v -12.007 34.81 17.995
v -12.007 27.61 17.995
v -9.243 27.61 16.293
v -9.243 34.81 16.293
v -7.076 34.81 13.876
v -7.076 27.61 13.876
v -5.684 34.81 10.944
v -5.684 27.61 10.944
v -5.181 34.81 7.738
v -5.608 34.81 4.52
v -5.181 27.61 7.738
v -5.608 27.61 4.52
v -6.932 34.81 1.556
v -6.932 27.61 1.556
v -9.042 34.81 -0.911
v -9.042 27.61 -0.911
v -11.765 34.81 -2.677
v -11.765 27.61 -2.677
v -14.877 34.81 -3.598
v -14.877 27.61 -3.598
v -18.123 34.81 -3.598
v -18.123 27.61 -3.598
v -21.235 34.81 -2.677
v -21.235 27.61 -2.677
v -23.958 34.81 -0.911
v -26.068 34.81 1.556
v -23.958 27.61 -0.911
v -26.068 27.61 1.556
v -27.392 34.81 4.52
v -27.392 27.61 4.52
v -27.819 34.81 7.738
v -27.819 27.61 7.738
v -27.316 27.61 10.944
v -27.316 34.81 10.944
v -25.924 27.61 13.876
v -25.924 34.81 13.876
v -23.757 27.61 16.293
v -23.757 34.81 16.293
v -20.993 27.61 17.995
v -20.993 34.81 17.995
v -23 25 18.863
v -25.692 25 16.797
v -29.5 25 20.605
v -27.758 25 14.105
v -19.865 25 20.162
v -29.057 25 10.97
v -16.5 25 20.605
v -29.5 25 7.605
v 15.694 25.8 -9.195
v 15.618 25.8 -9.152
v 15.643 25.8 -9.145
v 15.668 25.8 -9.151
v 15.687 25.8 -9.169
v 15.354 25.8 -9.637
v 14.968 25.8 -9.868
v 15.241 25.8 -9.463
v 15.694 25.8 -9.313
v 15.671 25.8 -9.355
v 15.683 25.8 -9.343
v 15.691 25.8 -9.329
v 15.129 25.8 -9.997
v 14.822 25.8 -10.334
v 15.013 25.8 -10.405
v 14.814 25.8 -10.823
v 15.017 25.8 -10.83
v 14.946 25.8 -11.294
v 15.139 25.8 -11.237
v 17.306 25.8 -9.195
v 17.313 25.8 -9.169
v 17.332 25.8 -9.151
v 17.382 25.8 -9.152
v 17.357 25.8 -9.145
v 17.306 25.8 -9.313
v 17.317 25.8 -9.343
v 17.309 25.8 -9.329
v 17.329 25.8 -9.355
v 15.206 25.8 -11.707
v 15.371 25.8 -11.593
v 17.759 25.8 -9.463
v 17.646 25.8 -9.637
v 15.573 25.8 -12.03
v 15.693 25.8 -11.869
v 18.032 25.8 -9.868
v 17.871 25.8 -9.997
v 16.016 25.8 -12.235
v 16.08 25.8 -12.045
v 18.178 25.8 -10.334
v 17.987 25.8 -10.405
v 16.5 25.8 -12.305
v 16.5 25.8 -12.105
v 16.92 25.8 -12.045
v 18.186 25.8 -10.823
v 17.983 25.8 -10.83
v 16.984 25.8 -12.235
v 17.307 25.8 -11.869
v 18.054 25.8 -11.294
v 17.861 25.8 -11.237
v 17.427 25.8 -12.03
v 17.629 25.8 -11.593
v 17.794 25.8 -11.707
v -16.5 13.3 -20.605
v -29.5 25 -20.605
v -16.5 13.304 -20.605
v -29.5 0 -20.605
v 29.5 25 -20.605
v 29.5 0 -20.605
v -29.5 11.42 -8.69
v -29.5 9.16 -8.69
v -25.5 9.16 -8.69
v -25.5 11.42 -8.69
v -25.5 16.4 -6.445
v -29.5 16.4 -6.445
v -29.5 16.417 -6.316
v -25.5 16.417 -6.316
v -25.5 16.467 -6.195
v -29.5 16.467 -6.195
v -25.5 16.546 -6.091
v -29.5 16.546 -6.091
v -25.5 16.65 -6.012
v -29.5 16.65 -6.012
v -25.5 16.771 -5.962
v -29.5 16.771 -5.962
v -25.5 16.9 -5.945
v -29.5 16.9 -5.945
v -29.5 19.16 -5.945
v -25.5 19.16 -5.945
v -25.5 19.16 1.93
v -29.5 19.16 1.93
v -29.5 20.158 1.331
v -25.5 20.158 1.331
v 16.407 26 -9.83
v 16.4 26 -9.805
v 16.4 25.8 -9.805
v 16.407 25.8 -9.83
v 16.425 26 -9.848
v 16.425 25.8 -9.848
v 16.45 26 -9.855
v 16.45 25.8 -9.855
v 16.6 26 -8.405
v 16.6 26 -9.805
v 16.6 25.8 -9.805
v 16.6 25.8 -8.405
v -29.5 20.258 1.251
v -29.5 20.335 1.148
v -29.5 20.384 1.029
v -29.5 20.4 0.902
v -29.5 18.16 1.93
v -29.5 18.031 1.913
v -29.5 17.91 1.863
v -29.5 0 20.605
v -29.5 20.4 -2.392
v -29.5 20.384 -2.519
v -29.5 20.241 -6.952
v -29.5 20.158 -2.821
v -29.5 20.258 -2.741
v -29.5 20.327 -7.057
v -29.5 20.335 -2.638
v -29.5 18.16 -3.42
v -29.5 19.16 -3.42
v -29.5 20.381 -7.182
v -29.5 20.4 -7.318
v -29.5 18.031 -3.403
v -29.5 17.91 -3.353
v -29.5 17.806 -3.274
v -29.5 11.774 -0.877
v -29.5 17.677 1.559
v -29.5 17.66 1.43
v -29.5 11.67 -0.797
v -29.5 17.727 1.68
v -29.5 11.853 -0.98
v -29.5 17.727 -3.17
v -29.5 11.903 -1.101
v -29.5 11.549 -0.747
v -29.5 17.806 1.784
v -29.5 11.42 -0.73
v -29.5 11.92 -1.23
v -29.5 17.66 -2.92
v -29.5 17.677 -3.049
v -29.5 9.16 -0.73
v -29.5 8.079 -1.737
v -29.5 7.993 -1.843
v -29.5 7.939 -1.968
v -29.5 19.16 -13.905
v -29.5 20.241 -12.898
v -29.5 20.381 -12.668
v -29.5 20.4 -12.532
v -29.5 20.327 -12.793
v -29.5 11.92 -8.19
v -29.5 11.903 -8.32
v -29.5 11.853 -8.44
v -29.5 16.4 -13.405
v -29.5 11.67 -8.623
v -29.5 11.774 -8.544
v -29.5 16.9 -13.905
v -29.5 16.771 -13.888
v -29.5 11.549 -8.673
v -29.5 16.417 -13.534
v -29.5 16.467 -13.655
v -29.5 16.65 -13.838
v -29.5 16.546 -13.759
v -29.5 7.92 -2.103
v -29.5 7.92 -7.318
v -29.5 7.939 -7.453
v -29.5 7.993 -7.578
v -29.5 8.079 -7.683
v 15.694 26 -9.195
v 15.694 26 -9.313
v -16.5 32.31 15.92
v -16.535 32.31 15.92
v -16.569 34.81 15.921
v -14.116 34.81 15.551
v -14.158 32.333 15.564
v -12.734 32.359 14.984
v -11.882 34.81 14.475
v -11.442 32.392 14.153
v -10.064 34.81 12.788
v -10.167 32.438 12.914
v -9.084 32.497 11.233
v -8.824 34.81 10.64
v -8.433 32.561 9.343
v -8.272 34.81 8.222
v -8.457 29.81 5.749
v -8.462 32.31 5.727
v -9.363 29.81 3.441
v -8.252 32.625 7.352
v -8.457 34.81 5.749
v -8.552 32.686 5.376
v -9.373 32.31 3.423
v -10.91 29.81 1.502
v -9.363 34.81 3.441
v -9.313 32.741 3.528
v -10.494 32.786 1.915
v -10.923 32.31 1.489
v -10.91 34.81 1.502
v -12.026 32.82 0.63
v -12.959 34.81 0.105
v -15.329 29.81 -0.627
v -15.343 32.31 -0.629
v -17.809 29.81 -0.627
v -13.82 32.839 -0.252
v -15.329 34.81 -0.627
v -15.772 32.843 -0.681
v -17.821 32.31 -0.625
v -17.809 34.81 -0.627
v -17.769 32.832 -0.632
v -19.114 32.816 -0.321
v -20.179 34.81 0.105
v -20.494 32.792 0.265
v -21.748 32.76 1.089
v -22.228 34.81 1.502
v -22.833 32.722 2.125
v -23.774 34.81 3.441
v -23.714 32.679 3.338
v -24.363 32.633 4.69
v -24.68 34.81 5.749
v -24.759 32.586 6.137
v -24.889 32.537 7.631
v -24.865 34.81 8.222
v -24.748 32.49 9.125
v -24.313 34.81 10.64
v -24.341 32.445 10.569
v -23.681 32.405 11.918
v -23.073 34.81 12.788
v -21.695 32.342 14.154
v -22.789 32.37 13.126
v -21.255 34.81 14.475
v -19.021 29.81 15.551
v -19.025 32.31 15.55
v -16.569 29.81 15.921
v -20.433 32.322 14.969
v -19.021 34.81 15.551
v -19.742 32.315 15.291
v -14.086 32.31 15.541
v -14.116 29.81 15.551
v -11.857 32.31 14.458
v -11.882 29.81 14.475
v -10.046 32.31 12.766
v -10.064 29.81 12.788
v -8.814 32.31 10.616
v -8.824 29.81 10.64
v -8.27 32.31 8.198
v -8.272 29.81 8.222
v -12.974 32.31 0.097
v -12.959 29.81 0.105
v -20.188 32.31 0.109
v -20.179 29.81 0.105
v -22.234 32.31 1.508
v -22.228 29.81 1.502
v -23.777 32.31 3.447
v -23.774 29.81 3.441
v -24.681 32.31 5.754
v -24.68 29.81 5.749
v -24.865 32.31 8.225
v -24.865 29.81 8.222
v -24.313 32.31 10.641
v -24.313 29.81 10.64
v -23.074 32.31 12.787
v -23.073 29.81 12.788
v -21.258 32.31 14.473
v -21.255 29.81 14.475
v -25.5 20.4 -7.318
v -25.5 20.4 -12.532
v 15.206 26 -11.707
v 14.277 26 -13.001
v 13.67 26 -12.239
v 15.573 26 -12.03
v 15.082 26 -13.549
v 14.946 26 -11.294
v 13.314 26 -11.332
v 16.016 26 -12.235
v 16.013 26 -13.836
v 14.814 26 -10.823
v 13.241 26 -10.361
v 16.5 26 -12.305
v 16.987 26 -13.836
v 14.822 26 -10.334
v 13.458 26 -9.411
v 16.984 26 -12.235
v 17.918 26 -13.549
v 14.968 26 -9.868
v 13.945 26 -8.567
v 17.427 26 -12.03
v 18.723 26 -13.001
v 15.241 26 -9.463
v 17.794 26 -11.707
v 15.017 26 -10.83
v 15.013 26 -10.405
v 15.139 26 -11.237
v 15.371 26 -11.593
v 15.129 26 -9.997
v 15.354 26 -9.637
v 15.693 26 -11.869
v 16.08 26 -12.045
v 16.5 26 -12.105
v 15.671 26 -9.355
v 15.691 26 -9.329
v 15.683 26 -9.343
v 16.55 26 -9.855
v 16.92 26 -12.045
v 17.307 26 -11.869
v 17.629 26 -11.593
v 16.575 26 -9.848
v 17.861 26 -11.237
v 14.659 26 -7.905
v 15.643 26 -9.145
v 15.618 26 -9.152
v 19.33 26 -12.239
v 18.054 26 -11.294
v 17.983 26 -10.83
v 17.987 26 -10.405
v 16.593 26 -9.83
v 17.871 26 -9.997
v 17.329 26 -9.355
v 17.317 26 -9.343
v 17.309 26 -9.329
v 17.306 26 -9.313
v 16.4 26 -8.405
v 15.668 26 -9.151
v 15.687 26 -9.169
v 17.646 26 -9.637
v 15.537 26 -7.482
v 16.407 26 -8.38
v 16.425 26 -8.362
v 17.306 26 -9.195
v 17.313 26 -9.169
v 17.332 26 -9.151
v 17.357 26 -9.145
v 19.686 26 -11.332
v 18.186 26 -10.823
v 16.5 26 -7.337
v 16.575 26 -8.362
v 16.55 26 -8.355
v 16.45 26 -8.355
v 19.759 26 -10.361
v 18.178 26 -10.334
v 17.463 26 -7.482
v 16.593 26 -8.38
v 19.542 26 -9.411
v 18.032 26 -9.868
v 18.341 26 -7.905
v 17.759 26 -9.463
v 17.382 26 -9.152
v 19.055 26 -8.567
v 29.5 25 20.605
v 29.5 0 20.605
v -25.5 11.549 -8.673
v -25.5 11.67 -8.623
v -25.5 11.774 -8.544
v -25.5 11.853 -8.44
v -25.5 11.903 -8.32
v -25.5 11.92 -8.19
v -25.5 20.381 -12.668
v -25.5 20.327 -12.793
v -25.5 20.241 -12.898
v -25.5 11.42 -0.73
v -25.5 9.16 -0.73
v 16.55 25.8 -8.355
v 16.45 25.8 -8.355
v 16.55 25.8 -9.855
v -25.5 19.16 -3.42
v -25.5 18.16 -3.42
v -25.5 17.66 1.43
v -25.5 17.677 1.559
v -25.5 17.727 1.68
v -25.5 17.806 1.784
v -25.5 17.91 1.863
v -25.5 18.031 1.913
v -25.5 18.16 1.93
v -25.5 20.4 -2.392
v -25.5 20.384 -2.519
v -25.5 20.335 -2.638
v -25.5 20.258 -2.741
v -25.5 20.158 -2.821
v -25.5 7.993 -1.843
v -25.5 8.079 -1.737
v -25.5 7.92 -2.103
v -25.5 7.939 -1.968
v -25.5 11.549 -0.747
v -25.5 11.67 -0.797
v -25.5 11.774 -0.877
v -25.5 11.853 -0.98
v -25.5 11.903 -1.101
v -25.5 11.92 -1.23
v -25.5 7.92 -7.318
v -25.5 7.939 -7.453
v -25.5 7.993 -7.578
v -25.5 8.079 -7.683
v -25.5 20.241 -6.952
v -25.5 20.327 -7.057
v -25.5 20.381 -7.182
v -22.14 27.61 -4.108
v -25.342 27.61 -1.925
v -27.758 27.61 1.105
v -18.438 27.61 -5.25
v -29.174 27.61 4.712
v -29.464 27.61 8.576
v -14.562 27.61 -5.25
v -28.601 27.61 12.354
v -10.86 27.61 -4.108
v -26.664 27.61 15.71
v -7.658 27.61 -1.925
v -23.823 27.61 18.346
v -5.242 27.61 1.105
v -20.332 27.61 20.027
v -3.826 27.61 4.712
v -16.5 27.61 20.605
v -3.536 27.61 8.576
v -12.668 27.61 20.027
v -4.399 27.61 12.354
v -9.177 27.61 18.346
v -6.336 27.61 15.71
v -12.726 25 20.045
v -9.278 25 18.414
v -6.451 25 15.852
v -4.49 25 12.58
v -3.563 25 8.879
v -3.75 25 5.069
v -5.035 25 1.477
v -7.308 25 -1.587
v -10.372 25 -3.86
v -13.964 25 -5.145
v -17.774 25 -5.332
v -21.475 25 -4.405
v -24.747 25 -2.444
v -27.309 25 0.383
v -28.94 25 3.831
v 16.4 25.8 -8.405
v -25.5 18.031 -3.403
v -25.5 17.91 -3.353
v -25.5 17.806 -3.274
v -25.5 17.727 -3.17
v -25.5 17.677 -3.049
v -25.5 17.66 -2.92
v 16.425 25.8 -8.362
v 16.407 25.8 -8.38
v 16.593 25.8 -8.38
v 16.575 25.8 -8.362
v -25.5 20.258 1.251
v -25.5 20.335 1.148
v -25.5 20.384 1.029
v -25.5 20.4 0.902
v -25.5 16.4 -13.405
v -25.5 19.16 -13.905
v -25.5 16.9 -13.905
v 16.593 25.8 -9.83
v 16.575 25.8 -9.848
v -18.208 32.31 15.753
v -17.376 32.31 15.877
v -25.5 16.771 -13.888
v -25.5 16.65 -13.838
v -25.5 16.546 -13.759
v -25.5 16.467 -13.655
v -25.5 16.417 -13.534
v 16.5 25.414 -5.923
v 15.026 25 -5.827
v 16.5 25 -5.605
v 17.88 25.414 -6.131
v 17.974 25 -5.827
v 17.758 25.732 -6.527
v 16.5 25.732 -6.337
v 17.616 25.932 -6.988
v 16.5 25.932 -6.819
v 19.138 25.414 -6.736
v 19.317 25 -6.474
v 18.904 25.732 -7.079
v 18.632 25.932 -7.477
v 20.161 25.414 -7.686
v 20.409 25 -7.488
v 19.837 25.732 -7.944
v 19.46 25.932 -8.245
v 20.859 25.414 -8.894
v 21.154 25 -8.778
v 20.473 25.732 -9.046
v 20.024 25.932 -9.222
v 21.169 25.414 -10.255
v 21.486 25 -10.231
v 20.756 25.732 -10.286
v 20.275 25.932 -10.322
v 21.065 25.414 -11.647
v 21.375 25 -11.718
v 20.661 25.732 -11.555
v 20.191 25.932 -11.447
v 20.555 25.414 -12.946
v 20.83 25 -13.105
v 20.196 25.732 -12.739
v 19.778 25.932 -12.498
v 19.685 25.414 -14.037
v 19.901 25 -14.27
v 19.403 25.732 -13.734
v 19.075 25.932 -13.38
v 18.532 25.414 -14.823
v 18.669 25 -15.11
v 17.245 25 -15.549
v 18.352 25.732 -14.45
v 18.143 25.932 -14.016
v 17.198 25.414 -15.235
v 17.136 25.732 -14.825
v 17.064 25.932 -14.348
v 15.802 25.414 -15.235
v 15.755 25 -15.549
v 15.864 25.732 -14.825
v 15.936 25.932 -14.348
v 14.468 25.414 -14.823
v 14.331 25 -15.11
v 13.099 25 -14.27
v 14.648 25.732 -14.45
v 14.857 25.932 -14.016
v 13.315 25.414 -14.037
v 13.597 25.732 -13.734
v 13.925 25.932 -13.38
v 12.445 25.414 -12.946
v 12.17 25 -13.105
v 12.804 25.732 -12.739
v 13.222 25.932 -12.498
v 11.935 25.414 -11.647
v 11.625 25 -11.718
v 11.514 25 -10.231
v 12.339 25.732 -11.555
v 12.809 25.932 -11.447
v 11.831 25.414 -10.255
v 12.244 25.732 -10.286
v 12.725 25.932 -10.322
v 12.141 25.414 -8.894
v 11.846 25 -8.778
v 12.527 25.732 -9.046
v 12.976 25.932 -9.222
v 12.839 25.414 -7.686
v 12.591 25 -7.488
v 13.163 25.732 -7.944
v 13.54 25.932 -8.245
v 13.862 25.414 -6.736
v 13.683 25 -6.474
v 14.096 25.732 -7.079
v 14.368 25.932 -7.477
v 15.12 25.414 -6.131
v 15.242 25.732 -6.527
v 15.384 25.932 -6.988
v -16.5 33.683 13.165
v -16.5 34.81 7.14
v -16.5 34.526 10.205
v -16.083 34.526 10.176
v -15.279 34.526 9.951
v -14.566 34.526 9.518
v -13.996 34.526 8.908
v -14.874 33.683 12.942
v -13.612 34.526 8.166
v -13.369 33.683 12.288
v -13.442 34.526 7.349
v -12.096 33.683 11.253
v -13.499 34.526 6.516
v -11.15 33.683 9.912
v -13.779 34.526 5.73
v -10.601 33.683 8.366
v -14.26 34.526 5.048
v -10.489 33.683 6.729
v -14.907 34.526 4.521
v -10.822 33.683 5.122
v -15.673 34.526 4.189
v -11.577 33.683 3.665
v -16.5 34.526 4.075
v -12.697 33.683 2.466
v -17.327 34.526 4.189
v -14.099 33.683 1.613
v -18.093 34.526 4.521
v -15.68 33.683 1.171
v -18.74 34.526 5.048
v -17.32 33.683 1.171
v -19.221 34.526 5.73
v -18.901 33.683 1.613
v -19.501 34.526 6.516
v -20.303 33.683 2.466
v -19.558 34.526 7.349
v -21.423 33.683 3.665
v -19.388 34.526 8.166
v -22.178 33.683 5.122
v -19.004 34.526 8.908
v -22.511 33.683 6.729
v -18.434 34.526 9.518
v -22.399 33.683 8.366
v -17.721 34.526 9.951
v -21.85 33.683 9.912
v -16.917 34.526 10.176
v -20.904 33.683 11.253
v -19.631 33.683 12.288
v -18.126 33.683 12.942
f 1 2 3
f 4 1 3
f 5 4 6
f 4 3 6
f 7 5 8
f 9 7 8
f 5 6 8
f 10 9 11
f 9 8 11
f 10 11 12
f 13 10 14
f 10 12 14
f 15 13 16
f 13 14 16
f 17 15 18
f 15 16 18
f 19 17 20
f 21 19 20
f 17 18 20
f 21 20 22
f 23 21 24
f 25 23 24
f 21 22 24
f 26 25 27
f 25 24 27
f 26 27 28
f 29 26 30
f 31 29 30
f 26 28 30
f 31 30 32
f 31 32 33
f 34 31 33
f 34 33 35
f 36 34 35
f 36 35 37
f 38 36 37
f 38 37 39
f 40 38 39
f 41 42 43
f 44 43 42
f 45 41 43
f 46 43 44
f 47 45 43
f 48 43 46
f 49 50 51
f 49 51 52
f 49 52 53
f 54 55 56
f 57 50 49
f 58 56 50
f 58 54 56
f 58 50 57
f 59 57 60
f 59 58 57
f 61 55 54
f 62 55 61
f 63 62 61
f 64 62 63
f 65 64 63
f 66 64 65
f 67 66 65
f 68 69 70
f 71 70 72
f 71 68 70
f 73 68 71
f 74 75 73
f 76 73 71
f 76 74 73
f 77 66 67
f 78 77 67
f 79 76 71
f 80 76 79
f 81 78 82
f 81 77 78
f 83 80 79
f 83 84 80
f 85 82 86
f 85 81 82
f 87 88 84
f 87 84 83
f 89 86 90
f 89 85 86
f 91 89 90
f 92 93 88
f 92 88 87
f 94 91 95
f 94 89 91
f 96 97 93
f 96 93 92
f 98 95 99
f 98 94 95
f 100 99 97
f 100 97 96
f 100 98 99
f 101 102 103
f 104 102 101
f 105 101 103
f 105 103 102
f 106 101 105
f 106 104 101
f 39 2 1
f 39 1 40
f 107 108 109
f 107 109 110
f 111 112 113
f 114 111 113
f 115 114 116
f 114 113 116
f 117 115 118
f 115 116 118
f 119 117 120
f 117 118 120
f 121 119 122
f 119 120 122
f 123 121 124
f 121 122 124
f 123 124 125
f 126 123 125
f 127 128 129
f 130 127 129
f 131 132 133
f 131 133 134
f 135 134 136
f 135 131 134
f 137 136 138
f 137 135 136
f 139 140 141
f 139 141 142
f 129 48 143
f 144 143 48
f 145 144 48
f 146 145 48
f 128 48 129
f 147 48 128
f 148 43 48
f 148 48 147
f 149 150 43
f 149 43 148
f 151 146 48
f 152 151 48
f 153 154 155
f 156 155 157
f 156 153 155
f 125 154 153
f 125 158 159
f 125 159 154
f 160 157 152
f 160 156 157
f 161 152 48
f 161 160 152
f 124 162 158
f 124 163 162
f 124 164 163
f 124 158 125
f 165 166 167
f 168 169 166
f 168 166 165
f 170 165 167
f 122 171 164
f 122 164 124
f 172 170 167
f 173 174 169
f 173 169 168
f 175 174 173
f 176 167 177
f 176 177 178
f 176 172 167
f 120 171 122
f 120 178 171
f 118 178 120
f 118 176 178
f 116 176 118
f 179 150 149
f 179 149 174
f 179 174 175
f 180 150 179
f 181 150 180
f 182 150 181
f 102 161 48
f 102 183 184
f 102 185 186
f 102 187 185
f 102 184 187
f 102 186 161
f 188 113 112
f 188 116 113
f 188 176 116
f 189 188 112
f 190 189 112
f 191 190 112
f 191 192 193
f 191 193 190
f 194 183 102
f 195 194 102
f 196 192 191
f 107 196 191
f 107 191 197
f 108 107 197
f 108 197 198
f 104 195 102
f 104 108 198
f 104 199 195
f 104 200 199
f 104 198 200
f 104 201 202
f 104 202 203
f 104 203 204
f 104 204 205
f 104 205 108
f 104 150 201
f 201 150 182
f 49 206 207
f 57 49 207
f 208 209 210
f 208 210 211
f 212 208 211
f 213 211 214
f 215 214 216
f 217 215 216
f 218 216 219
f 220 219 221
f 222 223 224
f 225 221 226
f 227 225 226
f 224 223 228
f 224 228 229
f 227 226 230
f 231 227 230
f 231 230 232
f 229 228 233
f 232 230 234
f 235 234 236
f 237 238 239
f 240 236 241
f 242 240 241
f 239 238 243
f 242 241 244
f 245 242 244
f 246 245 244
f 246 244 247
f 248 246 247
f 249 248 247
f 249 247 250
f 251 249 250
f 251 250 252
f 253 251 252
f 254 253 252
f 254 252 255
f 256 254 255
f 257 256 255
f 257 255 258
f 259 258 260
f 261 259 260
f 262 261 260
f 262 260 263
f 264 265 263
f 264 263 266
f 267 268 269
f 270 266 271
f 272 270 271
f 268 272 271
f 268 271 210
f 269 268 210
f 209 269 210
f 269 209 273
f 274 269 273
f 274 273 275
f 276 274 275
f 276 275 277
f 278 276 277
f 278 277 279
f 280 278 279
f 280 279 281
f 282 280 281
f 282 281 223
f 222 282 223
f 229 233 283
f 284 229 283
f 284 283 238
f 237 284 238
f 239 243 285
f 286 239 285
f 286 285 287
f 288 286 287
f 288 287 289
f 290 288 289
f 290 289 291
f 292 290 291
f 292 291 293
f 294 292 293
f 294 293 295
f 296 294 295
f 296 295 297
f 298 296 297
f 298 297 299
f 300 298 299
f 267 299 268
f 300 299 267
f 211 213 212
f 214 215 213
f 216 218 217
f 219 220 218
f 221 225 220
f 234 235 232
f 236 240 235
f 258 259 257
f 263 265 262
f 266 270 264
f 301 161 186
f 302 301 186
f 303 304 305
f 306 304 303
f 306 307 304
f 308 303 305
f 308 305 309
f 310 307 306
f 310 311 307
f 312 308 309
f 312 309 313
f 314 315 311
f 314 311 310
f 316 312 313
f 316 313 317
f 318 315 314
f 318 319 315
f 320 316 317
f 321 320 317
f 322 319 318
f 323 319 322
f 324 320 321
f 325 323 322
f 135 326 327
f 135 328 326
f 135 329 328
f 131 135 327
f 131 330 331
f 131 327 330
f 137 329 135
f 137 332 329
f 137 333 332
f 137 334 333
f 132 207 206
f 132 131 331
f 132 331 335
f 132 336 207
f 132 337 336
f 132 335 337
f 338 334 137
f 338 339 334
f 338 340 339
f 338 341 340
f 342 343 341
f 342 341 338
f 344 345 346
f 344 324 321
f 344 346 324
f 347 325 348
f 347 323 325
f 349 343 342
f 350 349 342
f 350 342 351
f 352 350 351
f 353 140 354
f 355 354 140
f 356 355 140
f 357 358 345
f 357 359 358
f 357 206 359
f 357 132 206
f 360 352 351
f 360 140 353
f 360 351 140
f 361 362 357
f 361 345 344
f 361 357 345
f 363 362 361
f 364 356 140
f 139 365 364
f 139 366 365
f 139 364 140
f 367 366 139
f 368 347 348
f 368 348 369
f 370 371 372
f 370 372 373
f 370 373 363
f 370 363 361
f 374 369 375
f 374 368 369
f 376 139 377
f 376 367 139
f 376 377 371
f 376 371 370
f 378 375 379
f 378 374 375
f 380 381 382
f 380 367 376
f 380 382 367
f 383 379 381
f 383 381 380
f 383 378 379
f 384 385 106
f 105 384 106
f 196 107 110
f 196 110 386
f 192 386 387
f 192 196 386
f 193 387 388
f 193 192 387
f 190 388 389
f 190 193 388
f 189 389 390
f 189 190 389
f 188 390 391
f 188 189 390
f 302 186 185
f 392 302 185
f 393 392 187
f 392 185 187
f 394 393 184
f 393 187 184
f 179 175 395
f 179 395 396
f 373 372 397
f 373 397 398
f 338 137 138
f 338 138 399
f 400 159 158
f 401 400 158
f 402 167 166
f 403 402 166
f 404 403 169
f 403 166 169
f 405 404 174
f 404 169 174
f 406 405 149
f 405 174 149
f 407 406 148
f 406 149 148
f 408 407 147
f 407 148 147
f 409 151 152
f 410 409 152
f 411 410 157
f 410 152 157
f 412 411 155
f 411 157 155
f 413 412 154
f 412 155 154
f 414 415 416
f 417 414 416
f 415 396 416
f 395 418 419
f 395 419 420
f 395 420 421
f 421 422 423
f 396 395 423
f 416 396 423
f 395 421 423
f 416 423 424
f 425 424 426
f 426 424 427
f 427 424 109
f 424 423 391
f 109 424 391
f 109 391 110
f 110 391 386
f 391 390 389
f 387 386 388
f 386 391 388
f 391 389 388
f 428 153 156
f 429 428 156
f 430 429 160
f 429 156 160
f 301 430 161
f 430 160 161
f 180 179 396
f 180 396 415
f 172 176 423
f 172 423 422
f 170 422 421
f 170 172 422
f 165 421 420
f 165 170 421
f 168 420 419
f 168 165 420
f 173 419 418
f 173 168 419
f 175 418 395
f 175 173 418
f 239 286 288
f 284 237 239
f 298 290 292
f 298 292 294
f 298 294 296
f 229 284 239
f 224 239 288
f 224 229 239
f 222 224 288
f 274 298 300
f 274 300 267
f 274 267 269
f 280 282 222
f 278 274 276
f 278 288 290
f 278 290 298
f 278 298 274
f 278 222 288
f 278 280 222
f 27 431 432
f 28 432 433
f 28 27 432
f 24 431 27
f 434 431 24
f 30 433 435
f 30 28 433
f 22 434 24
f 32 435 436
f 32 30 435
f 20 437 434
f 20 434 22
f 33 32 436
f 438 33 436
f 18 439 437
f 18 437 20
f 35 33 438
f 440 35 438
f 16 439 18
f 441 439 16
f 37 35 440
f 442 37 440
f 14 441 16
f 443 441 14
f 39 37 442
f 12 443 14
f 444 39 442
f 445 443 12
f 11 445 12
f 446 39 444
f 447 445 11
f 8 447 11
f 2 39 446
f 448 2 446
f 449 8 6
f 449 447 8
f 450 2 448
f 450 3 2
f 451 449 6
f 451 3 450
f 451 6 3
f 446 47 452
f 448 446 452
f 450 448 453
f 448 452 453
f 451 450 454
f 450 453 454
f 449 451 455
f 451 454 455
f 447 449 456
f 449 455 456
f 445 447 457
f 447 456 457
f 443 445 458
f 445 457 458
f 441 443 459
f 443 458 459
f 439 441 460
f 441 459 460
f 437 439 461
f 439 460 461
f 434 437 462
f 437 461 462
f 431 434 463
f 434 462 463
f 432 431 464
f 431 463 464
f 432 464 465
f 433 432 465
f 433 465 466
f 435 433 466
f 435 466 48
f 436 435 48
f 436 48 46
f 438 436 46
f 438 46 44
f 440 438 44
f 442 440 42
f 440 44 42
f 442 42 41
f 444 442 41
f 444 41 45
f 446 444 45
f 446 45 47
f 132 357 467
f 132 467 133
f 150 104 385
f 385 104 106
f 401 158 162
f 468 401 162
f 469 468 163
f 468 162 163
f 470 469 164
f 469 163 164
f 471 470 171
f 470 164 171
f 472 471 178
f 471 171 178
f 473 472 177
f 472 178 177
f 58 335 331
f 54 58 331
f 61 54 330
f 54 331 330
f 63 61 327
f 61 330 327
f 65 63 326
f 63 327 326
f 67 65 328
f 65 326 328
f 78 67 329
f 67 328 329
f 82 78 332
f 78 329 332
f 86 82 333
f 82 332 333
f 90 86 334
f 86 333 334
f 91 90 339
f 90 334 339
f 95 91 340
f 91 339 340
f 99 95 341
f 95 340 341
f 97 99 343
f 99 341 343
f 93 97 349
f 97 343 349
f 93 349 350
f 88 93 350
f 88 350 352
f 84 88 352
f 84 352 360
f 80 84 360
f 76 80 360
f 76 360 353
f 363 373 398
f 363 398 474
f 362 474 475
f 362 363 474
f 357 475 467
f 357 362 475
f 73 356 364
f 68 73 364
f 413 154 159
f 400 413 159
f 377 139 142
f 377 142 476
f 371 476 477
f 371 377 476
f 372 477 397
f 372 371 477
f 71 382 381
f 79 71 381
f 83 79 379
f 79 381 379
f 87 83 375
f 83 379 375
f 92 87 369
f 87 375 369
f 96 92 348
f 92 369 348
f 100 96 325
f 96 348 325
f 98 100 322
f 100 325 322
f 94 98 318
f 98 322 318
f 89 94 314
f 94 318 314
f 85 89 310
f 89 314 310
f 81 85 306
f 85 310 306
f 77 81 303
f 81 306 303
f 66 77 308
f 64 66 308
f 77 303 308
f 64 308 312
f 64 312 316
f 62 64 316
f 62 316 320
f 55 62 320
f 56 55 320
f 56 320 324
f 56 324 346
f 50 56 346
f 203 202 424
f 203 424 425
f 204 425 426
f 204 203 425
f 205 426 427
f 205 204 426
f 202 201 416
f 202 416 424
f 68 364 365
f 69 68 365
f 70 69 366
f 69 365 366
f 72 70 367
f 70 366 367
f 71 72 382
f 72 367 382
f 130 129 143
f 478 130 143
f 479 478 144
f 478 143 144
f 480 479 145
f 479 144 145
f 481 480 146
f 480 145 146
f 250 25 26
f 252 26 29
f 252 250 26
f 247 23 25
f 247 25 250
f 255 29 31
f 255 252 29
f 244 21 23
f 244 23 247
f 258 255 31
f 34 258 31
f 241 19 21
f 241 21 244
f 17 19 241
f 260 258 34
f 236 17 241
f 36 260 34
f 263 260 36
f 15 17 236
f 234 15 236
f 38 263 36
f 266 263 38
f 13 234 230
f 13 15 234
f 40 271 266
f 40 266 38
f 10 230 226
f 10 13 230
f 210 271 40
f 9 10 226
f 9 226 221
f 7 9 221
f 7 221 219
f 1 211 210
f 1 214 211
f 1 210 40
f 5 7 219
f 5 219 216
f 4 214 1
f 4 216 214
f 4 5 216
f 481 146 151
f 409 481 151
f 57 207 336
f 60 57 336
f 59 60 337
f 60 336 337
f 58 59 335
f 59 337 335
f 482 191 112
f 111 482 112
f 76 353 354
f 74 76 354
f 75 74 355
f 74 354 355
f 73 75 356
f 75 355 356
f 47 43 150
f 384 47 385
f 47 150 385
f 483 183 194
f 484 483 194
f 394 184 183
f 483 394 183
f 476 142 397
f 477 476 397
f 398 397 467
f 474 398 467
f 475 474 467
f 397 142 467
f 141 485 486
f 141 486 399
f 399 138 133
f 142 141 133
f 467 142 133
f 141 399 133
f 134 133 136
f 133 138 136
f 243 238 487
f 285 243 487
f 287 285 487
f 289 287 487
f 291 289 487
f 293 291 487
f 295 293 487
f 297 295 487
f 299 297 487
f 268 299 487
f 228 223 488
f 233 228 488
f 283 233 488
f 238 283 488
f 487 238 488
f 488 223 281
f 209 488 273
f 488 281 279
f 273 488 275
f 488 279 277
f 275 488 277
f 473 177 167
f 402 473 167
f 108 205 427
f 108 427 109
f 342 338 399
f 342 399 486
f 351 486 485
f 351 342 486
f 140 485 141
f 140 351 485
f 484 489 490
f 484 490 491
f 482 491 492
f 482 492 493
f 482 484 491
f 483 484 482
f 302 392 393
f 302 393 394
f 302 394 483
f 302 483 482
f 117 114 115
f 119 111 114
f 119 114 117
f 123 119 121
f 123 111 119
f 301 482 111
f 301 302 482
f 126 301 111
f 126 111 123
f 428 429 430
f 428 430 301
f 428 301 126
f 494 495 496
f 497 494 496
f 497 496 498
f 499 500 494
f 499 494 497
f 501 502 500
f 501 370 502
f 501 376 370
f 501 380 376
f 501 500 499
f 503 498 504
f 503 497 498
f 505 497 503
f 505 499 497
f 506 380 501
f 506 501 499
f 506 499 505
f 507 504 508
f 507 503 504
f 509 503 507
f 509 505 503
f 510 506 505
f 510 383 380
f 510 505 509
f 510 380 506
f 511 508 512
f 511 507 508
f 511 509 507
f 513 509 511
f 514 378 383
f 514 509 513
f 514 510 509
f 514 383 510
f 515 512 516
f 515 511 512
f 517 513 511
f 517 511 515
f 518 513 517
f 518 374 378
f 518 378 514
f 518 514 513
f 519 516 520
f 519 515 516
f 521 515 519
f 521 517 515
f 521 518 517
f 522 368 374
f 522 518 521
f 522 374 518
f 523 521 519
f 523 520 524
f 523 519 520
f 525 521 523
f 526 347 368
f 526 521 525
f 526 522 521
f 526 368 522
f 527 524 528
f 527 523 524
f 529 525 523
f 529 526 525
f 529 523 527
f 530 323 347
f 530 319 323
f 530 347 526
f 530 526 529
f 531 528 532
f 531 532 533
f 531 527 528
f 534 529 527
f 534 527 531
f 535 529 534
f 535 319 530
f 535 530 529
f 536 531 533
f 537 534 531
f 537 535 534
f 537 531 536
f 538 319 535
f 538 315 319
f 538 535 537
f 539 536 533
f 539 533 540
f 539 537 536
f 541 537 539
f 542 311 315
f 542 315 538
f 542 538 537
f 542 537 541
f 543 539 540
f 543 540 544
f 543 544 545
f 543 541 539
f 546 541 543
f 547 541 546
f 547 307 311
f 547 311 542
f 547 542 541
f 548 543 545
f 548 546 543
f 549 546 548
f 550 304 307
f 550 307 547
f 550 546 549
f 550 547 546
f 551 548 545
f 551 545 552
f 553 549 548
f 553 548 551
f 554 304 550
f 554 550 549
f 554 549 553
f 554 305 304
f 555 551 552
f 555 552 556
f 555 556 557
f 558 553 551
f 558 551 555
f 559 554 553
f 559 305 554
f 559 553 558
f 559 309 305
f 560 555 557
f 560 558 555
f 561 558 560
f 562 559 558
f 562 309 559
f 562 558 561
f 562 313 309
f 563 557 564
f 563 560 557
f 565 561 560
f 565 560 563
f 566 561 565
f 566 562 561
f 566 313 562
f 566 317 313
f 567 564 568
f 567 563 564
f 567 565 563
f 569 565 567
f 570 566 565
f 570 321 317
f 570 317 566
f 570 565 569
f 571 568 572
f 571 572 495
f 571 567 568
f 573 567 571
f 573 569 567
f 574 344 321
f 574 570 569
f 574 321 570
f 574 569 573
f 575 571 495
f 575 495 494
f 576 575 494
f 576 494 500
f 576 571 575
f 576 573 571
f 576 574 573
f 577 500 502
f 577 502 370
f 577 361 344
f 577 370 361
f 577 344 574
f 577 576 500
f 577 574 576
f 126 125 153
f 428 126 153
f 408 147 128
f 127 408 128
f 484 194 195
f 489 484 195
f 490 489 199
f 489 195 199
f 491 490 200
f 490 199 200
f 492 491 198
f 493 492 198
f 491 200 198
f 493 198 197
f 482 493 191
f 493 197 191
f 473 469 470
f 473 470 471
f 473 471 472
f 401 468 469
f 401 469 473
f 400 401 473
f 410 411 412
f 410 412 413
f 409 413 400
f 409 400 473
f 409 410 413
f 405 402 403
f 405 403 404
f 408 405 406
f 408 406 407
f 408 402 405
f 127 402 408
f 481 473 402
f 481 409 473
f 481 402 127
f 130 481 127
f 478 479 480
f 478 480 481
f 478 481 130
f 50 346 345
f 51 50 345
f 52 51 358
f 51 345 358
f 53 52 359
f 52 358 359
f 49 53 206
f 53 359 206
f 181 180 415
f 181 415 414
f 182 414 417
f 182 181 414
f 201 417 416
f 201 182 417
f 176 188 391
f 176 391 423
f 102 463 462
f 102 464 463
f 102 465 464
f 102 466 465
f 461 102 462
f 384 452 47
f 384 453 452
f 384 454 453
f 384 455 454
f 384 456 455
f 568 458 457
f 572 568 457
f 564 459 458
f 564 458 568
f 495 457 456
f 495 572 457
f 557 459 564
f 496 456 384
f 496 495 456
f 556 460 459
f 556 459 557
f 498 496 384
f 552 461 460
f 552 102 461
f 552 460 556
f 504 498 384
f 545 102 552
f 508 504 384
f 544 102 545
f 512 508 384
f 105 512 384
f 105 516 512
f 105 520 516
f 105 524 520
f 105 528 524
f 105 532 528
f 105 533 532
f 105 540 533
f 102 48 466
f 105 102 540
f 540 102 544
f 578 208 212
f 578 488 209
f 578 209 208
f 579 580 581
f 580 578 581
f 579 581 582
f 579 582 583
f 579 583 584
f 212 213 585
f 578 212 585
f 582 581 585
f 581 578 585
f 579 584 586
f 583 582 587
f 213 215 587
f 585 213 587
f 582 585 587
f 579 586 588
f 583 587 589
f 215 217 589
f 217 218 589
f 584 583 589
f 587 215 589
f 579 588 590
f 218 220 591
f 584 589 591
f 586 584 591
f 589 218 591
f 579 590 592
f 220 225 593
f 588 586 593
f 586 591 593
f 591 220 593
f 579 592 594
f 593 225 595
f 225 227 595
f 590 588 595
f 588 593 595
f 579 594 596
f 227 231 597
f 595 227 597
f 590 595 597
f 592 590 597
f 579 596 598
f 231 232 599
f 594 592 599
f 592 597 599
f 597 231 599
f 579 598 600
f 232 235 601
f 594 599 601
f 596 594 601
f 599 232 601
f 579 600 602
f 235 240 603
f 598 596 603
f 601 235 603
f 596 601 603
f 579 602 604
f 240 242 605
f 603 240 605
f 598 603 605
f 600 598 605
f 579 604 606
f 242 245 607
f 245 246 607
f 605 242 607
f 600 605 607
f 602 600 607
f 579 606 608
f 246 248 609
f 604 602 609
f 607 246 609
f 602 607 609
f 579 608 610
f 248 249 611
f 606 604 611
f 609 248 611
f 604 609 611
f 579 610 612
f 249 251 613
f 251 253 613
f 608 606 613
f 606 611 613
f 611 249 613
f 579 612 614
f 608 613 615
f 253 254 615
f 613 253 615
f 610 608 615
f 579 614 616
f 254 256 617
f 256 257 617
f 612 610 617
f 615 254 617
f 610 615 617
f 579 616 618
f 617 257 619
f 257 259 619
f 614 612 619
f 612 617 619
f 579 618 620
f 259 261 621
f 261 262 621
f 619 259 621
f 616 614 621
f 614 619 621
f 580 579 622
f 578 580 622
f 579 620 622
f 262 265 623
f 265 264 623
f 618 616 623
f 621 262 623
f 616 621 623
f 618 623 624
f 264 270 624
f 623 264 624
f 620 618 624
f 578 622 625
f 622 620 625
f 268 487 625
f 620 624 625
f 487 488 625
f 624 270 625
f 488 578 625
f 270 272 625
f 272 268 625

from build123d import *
from build123d.topology import SkipClean

# Parameters (mm, degrees)
CROQUIS1_W              = 59
CROQUIS1_H              = 41.21
SALIENTE_EXTRUIR1_DEPTH = 25
CROQUIS2_R              = 13
SALIENTE_EXTRUIR2_DEPTH = 9.81
CORTAR_EXTRUIR1_START   = -7.2
CROQUIS4_R              = 13
CROQUIS4_R_2            = 11.32
CORTAR_EXTRUIR1_DEPTH   = 7.2
CORTAR_EXTRUIR2_START   = -7.2
CORTAR_EXTRUIR2_DEPTH   = 7.2
CROQUIS7_R              = 8.32
CORTAR_EXTRUIR3_DEPTH   = 5
CROQUIS10_R             = 5
SALIENTE_EXTRUIR3_DEPTH = 1
REDONDEO1_R             = 2
CORTAR_EXTRUIR5_DEPTH   = 0.2
CROQUIS13_R             = 2.5
CORTAR_EXTRUIR6_DEPTH   = 5.2
ROSCA1_PITCH            = 0.8
CORTAR_EXTRUIR8_DEPTH   = 4
CROQUIS17_W             = 9.488888662
CROQUIS17_H             = 7.855040283
SALIENTE_EXTRUIR4_DEPTH = 10


with BuildPart() as part:
    # Croquis1 → Saliente-Extruir1 (new body)
    with BuildSketch(Plane(origin=(0, 0, 0), x_dir=(1, 0, 0), z_dir=(0, 1, 0))):
        Rectangle(CROQUIS1_W, CROQUIS1_H)
    extrude(amount=SALIENTE_EXTRUIR1_DEPTH)

    # Croquis2 → Saliente-Extruir2 (add)
    with BuildSketch(Plane(origin=(0, 25, 0), x_dir=(1, 0, 0), z_dir=(0, 1, 0))):
        with Locations(Location((-16.5, -7.605, 0), (0, 0, 270))):
            Circle(CROQUIS2_R)
    extrude(amount=SALIENTE_EXTRUIR2_DEPTH)

    # Croquis4 → Cortar-Extruir1 (cut)
    with BuildSketch(Plane(origin=(0, 34.81, 0), x_dir=(1, 0, 0), z_dir=(0, 1, 0)).offset(CORTAR_EXTRUIR1_START)):
        with Locations(Location((-16.5, -7.605, 0), (0, 0, 270))):
            Circle(CROQUIS4_R)
        with Locations(Location((-16.5, -7.605, 0), (0, 0, 270))):
            Circle(CROQUIS4_R_2, mode=Mode.SUBTRACT)
    extrude(amount=CORTAR_EXTRUIR1_DEPTH, mode=Mode.SUBTRACT)

    # Croquis6 → Cortar-Extruir2 (cut)
    with BuildSketch(Plane(origin=(0, 34.81, 0), x_dir=(1, 0, 0), z_dir=(0, 1, 0)).offset(CORTAR_EXTRUIR2_START)):
        with BuildLine():
            Line((-12.00663823, -17.995), (-20.99336177, -17.995))
            ThreePointArc((-20.99336177, -17.995), (-16.5, -18.925), (-12.00663823, -17.995))
        make_face()
    extrude(amount=CORTAR_EXTRUIR2_DEPTH, mode=Mode.SUBTRACT)

    # Croquis7 → Cortar-Extruir3 (cut)
    with BuildSketch(Plane(origin=(0, 34.81, 0), x_dir=(1, 0, 0), z_dir=(0, 1, 0))):
        with Locations(Location((-16.568588437, -7.600561682, 0), (0, 0, 270))):
            Circle(CROQUIS7_R)
    extrude(amount=-CORTAR_EXTRUIR3_DEPTH, mode=Mode.SUBTRACT)

    # Croquis9 → Revolución2 (revolve)
    with BuildSketch(Plane.ZY.offset(16.5)):
        with BuildLine():
            Line((15.920561682, 32.31), (7.14, 32.31))
            Line((7.14, 32.31), (7.14, 34.81))
            ThreePointArc((7.14, 34.81), (11.704763506, 34.17282232), (15.920561682, 32.31))
        make_face()
    revolve(axis=Axis((-16.5, 32.31, 7.14), (0, 1, 0)))

    # Croquis10 → Saliente-Extruir3 (add)
    with BuildSketch(Plane(origin=(0, 25, 0), x_dir=(1, 0, 0), z_dir=(0, 1, 0))):
        with Locations(Location((16.5, 10.605, 0), (0, 0, 270))):
            Circle(CROQUIS10_R)
    extrude(amount=SALIENTE_EXTRUIR3_DEPTH)

    # Redondeo1
    # the kernel refuses this fillet: 2 mm, written as the material it takes off along each edge
    with BuildSketch(Plane(origin=(16.5, 26, -10.605), x_dir=(0, 0, 1), z_dir=(-1, 0, 0))) as redondeo1_piece_1:
        with BuildLine():
            CenterArc((3.267949192, -2), REDONDEO1_R, 30, 60)
            Line((3.267949192, 0), (3.267949192, 0.04))
            Line((3.267949192, 0.04), (5, 0.04))
            Line((5, 0.04), (5.04, 0))
            ThreePointArc((5.04, 0), (5.04, -0.5), (5.034641016, -0.98))
            Line((5.034641016, -0.98), (5, -1))
        make_face()
    revolve(axis=Axis((16.5, 26, -10.605), (0, 1, 0)), mode=Mode.SUBTRACT)

    # Croquis12 → Cortar-Extruir5 (cut)
    with BuildSketch(Plane(origin=(0, 26, 0), x_dir=(1, 0, 0), z_dir=(0, 1, 0))):
        with BuildLine():
            Line((15.693774225, 9.194547086), (15.693774225, 9.312956107))
            ThreePointArc((15.693774225, 9.312956107), (15.687825385, 9.33660976), (15.671394411, 9.354634942))
            ThreePointArc((15.671394411, 9.354634942), (16.5, 12.105), (17.328605589, 9.354634942))
            ThreePointArc((17.328605589, 9.354634942), (17.312174615, 9.33660976), (17.306225775, 9.312956107))
            Line((17.306225775, 9.312956107), (17.306225775, 9.194547086))
            ThreePointArc((17.306225775, 9.194547086), (17.331703456, 9.150973517), (17.38217201, 9.151806089))
            ThreePointArc((17.38217201, 9.151806089), (16.5, 12.305), (15.61782799, 9.151806089))
            ThreePointArc((15.61782799, 9.151806089), (15.668296544, 9.150973517), (15.693774225, 9.194547086))
        make_face()
        with BuildLine():
            Line((16.55, 8.355), (16.45, 8.355))
            ThreePointArc((16.45, 8.355), (16.414644661, 8.369644661), (16.4, 8.405))
            Line((16.4, 8.405), (16.4, 9.805))
            ThreePointArc((16.4, 9.805), (16.414644661, 9.840355339), (16.45, 9.855))
            Line((16.45, 9.855), (16.55, 9.855))
            ThreePointArc((16.55, 9.855), (16.585355339, 9.840355339), (16.6, 9.805))
            Line((16.6, 9.805), (16.6, 8.405))
            ThreePointArc((16.6, 8.405), (16.585355339, 8.369644661), (16.55, 8.355))
        make_face()
    extrude(amount=-CORTAR_EXTRUIR5_DEPTH, mode=Mode.SUBTRACT)

    # Croquis13 → Cortar-Extruir6 (cut)
    with BuildSketch(Plane(origin=(0, 0, -20.605), x_dir=(-1, 0, 0), z_dir=(0, 0, -1))):
        with Locations((19, 13.3)):
            Circle(CROQUIS13_R)
    extrude(amount=-CORTAR_EXTRUIR6_DEPTH, mode=Mode.SUBTRACT)

    # Rosca1: the profile of Perfil de rosca1 profile screwed along a right-hand helix of 6.5 turns, 8 arcs to a turn; built about Z, then put on its axis
    with SkipClean():  # the faces are left unmerged after this step: merging them gives an invalid solid
        rosca1_z = Axis((0, 0, 0), (0, 0, 1))
        rosca1_corners = [(2.5003, 0, -0.000173205), (2.5003, 0, 0.700173203), (2.0669873, 0, 0.449999999), (2.0669873, 0, 0.249999999)]
        with BuildLine(mode=Mode.PRIVATE) as rosca1_profile:
            Line(rosca1_corners[0], rosca1_corners[1])
            Line(rosca1_corners[1], rosca1_corners[2])
            Line(rosca1_corners[2], rosca1_corners[3])
            Line(rosca1_corners[3], rosca1_corners[0])
        rosca1_cap = Face(rosca1_profile.wire())
        rosca1_turn_angles = [0, 22.5, 45, 67.5, 90, 112.5, 135, 157.5, 180, 202.5, 225, 247.5, 270, 292.5, 315, 337.5, 360]
        rosca1_turn_weights = [1, 0.9238795325112867, 1, 0.9238795325112867, 1, 0.9238795325112867, 1, 0.9238795325112867, 1, 0.9238795325112867, 1, 0.9238795325112867, 1, 0.9238795325112867, 1, 0.9238795325112867, 1]
        rosca1_turn_rails = [Edge.make_bspline([Vector(p[0], p[1], 0).rotate(rosca1_z, rosca1_turn_angles[k]) / rosca1_turn_weights[k] + Vector(0, 0, p[2] + ROSCA1_PITCH * rosca1_turn_angles[k] / 360) for k in range(17)], [0, 0, 0, 1, 1, 2, 2, 3, 3, 4, 4, 5, 5, 6, 6, 7, 7, 8, 8, 8], 2, rosca1_turn_weights) for p in rosca1_corners]
        rosca1_turn_sides = [Face.make_surface_from_curves(rosca1_turn_rails[p[0]], rosca1_turn_rails[p[1]]) for p in [(0, 1), (1, 2), (2, 3), (3, 0)]]
        rosca1_last_angles = [2160, 2182.5, 2205, 2227.5, 2250, 2272.5, 2295, 2317.5, 2340]
        rosca1_last_weights = [1, 0.9238795325112867, 1, 0.9238795325112867, 1, 0.9238795325112867, 1, 0.9238795325112867, 1]
        rosca1_last_rails = [Edge.make_bspline([Vector(p[0], p[1], 0).rotate(rosca1_z, rosca1_last_angles[k]) / rosca1_last_weights[k] + Vector(0, 0, p[2] + ROSCA1_PITCH * rosca1_last_angles[k] / 360) for k in range(9)], [0, 0, 0, 1, 1, 2, 2, 3, 3, 4, 4, 4], 2, rosca1_last_weights) for p in rosca1_corners]
        rosca1_last_sides = [Face.make_surface_from_curves(rosca1_last_rails[p[0]], rosca1_last_rails[p[1]]) for p in [(0, 1), (1, 2), (2, 3), (3, 0)]]
        rosca1 = Plane(origin=(-19, 13.3, -20.605), x_dir=(1, 0, 0), z_dir=(0, 0, 1)) * Solid(Shell([*[p.moved(Location((0, 0, ROSCA1_PITCH * i))) for i in range(6) for p in rosca1_turn_sides], *rosca1_last_sides, rosca1_cap, rosca1_cap.rotate(rosca1_z, 2340).moved(Location((0, 0, ROSCA1_PITCH * 2340 / 360)))]))
        add(rosca1)

    # Croquis16 → Cortar-Extruir8 (cut)
    with SkipClean():  # the faces are left unmerged after this step: merging them gives an invalid solid
        with BuildSketch(Plane.ZY.offset(29.5)):
            with BuildLine():
                Line((-5.945, 19.16), (-6.951704527, 20.240791007))
                ThreePointArc((-6.951704527, 20.240791007), (-7.118070383, 20.358473284), (-7.317575391, 20.4))
                Line((-7.317575391, 20.4), (-12.532424609, 20.4))
                ThreePointArc((-12.532424609, 20.4), (-12.731929617, 20.358473284), (-12.898295473, 20.240791007))
                Line((-12.898295473, 20.240791007), (-13.905, 19.16))
                Line((-13.905, 19.16), (-13.905, 16.9))
                ThreePointArc((-13.905, 16.9), (-13.758553391, 16.546446609), (-13.405, 16.4))
                Line((-13.405, 16.4), (-6.445, 16.4))
                ThreePointArc((-6.445, 16.4), (-6.091446609, 16.546446609), (-5.945, 16.9))
                Line((-5.945, 16.9), (-5.945, 19.16))
            make_face()
            with BuildLine():
                Line((1.93, 19.16), (1.330694375, 20.15750198))
                ThreePointArc((1.330694375, 20.15750198), (1.148320916, 20.335172948), (0.902100476, 20.4))
                Line((0.902100476, 20.4), (-2.392100476, 20.4))
                ThreePointArc((-2.392100476, 20.4), (-2.638320916, 20.335172948), (-2.820694375, 20.15750198))
                Line((-2.820694375, 20.15750198), (-3.42, 19.16))
                Line((-3.42, 19.16), (-3.42, 18.16))
                ThreePointArc((-3.42, 18.16), (-3.273553391, 17.806446609), (-2.92, 17.66))
                Line((-2.92, 17.66), (1.43, 17.66))
                ThreePointArc((1.43, 17.66), (1.783553391, 17.806446609), (1.93, 18.16))
                Line((1.93, 18.16), (1.93, 19.16))
            make_face()
            with BuildLine():
                ThreePointArc((-1.736855309, 8.079208993), (-1.903221166, 7.961526716), (-2.102726174, 7.92))
                Line((-2.102726174, 7.92), (-7.317575391, 7.92))
                ThreePointArc((-7.317575391, 7.92), (-7.517080399, 7.961526716), (-7.683446256, 8.079208993))
                Line((-7.683446256, 8.079208993), (-8.690150783, 9.16))
                Line((-8.690150783, 9.16), (-8.690150783, 11.42))
                ThreePointArc((-8.690150783, 11.42), (-8.543704173, 11.773553391), (-8.190150783, 11.92))
                Line((-8.190150783, 11.92), (-1.230150783, 11.92))
                ThreePointArc((-1.230150783, 11.92), (-0.876597392, 11.773553391), (-0.730150783, 11.42))
                Line((-0.730150783, 11.42), (-0.730150783, 9.16))
                Line((-0.730150783, 9.16), (-1.736855309, 8.079208993))
            make_face()
        extrude(amount=-CORTAR_EXTRUIR8_DEPTH, mode=Mode.SUBTRACT)

    # Croquis17 → Saliente-Extruir4 (add)
    with BuildSketch(Plane(origin=(0, 0, -20.605), x_dir=(-1, 0, 0), z_dir=(0, 0, -1))):
        with Locations((19.260558774, 13.137356389)):
            Rectangle(CROQUIS17_W, CROQUIS17_H)
    extrude(amount=-SALIENTE_EXTRUIR4_DEPTH)


solid = part.part
